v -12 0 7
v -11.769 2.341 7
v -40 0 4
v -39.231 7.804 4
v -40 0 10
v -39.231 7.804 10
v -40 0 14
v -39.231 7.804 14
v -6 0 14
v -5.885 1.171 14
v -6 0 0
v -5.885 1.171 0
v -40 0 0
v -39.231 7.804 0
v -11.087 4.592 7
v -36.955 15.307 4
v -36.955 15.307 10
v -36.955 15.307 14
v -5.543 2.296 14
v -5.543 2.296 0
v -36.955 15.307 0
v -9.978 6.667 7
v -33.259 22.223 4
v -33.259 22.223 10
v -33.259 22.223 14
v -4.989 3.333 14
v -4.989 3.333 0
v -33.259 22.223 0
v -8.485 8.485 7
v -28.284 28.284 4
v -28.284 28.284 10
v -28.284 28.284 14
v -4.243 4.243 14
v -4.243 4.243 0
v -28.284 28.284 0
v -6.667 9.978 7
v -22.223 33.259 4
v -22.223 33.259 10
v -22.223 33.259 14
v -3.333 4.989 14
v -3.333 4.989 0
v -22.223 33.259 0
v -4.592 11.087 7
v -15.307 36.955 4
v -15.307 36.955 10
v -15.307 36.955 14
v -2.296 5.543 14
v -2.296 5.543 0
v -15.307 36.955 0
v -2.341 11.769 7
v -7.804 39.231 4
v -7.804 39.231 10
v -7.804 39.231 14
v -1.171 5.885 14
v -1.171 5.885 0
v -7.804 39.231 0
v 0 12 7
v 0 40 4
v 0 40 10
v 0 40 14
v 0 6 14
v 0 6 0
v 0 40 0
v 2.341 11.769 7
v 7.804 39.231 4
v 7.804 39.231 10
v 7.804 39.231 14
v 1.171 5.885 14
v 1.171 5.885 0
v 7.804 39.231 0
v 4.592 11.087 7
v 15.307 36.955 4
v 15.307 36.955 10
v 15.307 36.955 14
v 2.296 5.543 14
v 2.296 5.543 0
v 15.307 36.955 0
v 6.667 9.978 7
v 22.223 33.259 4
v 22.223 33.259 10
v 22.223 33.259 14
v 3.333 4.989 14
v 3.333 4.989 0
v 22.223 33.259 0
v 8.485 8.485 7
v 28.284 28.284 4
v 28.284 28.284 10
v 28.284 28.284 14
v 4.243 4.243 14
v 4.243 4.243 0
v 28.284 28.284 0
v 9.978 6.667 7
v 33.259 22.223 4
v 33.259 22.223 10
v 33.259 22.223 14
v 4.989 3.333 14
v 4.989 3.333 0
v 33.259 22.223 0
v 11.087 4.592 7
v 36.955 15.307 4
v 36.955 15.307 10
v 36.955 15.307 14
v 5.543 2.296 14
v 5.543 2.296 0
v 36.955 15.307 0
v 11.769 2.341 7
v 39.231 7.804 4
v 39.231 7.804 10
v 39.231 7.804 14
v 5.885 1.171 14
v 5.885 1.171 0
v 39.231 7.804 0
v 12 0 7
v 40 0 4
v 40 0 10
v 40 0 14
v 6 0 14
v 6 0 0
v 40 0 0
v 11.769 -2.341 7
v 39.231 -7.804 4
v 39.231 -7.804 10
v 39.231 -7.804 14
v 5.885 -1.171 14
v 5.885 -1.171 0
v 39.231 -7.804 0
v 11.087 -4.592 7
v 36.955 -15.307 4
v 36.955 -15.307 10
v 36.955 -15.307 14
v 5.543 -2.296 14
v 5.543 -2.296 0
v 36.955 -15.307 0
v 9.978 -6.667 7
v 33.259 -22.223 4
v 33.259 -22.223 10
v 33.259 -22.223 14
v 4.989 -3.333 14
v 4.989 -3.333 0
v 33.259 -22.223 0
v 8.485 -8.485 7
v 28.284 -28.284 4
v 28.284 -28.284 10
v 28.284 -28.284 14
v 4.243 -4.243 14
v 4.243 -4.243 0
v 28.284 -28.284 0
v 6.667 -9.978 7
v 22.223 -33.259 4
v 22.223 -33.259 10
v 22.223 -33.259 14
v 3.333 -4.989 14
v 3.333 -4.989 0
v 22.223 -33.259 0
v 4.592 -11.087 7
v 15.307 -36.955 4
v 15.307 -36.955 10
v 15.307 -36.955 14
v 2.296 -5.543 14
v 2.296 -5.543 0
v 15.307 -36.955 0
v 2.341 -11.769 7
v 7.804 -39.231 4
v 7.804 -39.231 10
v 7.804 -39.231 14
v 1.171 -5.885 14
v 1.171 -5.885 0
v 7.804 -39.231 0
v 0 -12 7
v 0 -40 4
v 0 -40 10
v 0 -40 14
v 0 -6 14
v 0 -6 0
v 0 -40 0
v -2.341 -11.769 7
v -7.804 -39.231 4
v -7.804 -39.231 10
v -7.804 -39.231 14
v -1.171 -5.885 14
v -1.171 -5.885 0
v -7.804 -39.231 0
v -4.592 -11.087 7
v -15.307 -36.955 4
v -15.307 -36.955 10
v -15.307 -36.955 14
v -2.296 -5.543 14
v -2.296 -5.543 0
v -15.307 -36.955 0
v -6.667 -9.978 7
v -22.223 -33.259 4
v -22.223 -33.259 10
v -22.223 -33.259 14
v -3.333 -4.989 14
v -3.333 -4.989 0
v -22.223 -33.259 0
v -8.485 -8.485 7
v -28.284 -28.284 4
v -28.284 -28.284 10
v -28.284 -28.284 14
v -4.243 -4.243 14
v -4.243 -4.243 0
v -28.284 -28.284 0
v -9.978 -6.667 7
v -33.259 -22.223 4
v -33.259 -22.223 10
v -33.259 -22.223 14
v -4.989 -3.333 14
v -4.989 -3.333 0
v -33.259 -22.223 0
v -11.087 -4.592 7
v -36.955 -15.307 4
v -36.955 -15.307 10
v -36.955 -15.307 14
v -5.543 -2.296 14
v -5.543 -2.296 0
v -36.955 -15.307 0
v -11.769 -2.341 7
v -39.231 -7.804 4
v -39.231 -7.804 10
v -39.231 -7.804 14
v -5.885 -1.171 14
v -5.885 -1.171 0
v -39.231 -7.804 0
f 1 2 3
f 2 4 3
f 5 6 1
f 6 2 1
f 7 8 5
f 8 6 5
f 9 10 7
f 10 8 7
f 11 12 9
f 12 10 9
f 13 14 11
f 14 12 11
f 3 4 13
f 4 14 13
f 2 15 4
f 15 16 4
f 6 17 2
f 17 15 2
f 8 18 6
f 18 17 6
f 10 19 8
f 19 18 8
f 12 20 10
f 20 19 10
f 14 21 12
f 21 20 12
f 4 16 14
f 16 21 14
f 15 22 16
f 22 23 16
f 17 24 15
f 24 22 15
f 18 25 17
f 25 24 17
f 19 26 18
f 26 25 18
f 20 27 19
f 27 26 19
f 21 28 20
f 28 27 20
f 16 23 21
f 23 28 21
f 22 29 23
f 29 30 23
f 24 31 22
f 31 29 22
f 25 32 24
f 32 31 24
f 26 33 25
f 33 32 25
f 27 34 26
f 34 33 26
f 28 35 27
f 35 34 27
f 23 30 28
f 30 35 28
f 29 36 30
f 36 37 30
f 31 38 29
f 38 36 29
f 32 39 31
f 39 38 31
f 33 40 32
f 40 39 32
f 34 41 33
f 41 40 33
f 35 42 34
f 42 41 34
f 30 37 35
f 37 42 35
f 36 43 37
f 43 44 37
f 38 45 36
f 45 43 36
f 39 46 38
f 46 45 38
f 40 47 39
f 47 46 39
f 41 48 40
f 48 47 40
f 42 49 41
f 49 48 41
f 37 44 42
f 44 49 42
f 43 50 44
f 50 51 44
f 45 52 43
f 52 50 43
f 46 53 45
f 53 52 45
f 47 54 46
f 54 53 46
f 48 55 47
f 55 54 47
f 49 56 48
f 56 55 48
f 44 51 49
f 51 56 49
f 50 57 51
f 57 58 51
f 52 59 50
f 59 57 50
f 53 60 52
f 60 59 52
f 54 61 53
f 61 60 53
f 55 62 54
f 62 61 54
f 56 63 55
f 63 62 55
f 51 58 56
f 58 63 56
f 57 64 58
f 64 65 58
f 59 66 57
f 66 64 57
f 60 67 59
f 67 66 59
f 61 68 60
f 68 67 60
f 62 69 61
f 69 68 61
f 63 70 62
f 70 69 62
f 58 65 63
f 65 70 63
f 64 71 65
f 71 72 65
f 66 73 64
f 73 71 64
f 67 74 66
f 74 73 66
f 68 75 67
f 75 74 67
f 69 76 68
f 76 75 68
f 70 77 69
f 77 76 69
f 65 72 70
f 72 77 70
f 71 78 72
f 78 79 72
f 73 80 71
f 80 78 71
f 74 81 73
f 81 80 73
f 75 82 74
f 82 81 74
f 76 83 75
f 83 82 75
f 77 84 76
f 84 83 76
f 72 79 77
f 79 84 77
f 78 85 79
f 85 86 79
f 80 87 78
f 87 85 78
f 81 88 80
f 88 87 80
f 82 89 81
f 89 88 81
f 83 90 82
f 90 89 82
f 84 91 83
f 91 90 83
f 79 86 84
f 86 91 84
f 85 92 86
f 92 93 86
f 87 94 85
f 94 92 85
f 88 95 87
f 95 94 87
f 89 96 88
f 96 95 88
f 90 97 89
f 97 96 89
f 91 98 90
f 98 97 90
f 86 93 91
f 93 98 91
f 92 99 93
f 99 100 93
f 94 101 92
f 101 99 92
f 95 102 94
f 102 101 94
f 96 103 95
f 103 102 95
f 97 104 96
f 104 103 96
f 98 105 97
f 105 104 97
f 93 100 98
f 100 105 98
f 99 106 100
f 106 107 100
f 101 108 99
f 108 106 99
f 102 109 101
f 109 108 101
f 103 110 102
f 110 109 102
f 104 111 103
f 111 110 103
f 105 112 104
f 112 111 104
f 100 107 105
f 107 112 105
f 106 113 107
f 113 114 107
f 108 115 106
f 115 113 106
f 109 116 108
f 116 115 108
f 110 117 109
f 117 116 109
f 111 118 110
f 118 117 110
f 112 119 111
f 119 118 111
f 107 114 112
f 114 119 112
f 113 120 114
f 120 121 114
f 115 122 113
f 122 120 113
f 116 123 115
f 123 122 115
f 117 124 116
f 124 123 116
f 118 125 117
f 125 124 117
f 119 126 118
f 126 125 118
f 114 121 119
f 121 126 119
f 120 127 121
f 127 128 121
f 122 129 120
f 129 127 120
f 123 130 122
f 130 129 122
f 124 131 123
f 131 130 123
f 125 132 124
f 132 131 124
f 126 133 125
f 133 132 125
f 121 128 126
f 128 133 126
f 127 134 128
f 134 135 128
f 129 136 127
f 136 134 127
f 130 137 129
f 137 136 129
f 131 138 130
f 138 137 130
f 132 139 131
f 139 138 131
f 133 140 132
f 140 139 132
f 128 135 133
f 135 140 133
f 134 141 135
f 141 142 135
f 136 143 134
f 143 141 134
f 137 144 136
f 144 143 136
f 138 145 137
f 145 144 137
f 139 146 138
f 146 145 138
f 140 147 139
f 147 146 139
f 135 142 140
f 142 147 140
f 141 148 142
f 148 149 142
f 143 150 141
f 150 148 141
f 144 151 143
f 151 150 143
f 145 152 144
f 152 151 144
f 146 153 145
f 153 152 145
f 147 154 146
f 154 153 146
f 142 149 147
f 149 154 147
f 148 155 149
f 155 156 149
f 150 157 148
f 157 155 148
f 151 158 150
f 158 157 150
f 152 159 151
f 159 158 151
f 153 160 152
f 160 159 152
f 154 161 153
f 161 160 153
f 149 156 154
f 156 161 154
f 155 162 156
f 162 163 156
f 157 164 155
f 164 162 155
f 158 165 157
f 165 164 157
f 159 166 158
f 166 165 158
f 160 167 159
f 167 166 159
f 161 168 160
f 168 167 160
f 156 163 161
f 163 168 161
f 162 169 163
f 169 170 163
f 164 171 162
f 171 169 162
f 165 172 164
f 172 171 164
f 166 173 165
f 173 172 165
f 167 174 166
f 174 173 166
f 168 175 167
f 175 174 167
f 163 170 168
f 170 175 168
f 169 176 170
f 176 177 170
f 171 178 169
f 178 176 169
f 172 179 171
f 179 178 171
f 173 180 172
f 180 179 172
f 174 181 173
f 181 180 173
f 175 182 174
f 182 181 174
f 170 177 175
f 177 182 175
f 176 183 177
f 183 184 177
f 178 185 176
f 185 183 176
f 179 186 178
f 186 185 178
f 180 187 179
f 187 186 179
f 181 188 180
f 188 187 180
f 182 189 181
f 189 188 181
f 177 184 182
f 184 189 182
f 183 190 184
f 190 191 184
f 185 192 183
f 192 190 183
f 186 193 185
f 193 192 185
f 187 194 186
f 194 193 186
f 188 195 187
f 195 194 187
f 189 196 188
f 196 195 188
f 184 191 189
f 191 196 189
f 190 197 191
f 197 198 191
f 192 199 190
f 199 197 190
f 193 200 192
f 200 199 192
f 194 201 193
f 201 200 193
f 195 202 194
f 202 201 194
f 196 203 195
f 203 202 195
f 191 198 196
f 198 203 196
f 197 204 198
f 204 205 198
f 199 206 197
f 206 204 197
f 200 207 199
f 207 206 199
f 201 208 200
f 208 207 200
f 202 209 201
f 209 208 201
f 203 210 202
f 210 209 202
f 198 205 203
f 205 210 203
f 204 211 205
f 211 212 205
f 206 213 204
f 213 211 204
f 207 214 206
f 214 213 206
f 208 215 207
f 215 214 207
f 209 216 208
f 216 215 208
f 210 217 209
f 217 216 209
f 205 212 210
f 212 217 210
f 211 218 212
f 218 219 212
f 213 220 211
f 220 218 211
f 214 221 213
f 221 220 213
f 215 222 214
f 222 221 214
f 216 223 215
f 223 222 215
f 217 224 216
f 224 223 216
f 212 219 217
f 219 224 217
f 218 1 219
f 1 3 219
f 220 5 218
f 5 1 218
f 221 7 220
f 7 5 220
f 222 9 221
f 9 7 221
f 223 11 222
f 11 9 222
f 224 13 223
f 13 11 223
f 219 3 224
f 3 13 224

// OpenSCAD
$fn = 32;

// ----------------------------------------------------------------------
// Revolved part: V-groove pulley R40
// ----------------------------------------------------------------------

// --- parameters (mm) ---
bore_r = 6;               // bore radius
rim_r = 40;               // rim radius
rim_t = 14;               // rim width
groove_r = 12;            // groove root radius
groove_w = 3;             // groove half width
revolve_angle = 360;      // revolve sweep, degrees

bore_d = 2 * bore_r;
rim_d = 2 * rim_r;
groove_d = 2 * groove_r;

profile = [[6, 0], [40, 0], [40, 4], [12, 7], [40, 10], [40, 14], [6, 14]];  // primary outline, 7 points, counter clockwise

// --- the one profile operation ---
rotate_extrude(angle = revolve_angle) polygon(points = profile);
